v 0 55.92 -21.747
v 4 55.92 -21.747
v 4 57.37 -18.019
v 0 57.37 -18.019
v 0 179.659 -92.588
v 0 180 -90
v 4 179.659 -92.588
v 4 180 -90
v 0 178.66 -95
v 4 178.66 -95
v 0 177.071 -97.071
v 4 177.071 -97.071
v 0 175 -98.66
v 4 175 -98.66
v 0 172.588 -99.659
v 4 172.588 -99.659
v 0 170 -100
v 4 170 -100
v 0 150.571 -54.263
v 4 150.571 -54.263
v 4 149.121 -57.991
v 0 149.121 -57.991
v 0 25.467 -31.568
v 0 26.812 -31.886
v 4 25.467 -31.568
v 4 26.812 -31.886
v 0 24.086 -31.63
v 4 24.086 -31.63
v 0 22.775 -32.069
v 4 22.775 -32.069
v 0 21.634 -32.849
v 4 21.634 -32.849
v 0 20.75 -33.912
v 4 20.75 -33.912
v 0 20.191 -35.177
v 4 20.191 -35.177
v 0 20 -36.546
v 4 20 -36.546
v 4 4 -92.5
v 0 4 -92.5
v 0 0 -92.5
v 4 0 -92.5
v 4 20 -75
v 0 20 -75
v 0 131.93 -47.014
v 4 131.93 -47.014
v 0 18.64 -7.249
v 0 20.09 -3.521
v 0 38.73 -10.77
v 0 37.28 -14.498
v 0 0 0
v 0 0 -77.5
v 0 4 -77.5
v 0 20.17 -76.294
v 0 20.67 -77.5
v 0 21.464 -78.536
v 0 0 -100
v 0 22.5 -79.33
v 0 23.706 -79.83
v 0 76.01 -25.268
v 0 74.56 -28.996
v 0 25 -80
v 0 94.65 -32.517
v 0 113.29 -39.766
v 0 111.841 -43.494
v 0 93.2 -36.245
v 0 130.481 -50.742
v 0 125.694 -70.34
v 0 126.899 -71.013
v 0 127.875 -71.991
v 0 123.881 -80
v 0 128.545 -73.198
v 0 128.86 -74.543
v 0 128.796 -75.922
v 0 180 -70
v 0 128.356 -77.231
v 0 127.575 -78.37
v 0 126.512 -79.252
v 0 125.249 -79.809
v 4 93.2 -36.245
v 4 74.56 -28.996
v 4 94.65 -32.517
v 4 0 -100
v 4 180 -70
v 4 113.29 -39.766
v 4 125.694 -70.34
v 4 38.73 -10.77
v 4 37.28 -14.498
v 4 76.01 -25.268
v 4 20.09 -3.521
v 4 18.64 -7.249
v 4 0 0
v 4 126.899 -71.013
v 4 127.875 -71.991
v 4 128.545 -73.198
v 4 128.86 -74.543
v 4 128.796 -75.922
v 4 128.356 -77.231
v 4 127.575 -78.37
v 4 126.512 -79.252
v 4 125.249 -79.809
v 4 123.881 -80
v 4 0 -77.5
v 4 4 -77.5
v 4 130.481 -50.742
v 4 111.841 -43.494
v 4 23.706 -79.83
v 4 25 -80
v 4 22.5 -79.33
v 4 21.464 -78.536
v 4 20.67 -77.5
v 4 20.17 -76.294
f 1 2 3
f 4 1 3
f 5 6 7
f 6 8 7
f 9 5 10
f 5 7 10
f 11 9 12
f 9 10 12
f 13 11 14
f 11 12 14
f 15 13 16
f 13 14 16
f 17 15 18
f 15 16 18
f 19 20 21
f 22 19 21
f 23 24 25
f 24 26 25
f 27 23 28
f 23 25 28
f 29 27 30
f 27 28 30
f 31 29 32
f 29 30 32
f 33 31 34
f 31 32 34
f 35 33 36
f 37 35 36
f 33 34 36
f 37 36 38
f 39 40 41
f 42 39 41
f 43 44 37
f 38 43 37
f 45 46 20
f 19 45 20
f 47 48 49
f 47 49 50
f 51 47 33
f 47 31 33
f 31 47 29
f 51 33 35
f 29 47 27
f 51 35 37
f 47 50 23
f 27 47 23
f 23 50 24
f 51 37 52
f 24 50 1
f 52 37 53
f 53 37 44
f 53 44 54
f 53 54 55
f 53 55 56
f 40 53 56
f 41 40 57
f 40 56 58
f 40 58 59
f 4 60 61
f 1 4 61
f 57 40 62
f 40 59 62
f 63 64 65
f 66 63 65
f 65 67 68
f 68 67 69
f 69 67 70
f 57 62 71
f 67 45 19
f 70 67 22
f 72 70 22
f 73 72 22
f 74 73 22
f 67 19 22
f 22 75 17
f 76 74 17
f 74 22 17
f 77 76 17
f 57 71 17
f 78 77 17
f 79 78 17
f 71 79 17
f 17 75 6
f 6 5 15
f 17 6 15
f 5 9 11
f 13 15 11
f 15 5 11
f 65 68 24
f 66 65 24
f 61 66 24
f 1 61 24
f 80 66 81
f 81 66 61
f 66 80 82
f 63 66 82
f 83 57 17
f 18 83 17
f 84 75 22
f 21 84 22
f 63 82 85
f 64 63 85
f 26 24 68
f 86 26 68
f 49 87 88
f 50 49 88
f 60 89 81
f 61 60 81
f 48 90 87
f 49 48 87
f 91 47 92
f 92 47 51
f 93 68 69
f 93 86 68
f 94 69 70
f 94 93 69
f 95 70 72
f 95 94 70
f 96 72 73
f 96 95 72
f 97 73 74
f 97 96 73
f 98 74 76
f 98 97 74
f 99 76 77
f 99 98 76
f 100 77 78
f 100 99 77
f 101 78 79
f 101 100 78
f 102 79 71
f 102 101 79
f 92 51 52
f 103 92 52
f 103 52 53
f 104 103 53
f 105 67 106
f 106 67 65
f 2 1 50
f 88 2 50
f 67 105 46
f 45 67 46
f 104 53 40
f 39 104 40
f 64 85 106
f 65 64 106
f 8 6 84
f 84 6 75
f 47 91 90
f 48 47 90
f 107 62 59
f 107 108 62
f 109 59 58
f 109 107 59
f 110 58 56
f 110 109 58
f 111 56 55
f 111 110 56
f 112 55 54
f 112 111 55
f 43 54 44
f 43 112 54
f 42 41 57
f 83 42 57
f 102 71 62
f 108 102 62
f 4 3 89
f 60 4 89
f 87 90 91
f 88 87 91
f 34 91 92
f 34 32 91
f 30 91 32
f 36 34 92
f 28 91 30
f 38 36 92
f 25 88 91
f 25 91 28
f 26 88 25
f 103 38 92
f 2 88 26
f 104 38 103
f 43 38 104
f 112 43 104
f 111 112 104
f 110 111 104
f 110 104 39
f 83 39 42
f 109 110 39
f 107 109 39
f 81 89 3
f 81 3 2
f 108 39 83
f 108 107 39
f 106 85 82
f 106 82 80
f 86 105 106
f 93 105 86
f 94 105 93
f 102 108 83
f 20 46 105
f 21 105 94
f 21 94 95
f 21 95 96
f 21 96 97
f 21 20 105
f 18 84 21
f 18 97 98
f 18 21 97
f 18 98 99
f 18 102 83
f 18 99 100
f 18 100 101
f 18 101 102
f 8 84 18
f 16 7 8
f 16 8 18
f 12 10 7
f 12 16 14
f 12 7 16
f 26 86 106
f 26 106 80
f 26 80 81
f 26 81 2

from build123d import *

# Parameters (mm, degrees)
ESTRUSIONE_ESTRUSIONE1_DEPTH = 4
ESTRUSIONE_ESTRUSIONE2_DEPTH = 4
RACCORDO2_R                  = 10
RACCORDO3_R                  = 5


with BuildPart() as part:
    # Schizzo1 → Estrusione-Estrusione1 (new body)
    with BuildSketch(Plane(origin=(0, 0, 0), x_dir=(0, 0, -1), z_dir=(1, 0, 0))):
        Polygon((70, 180), (0, 0), (77.5, 0), (77.5, 4), (92.5, 4), (92.5, 0), (100, 0), (100, 180), align=None)
        Polygon((80, 150.533691669), (80, 20), (29.236897684, 20), align=None, mode=Mode.SUBTRACT)
    extrude(amount=ESTRUSIONE_ESTRUSIONE1_DEPTH)

    # Schizzo2 → Estrusione-Estrusione2 (add)
    with BuildSketch(Plane(origin=(4, 0, 0), x_dir=(0, 0, -1), z_dir=(1, 0, 0))):
        Polygon((7.248925223, 18.640093431), (3.520906537, 20.089878475), (10.76983176, 38.729971906), (14.497850446, 37.280186862), align=None)
        Polygon((28.995700892, 74.560373723), (21.746775669, 55.920280292), (18.018756983, 57.370065337), (25.267682206, 76.010158768), align=None)
        Polygon((43.493551339, 111.840560585), (36.244626115, 93.200467154), (32.516607429, 94.650252199), (39.765532652, 113.29034563), align=None)
        Polygon((57.991401785, 149.120747447), (50.742476562, 130.480654016), (47.014457876, 131.93043906), (54.263383099, 150.570532491), align=None)
    extrude(amount=-ESTRUSIONE_ESTRUSIONE2_DEPTH)

    # Raccordo2
    raccordo2_edges = [part.edges().sort_by_distance(p)[0] for p in [
        (2, 180, -100),
    ]]
    fillet(raccordo2_edges, radius=RACCORDO2_R)

    # Raccordo3
    raccordo3_edges = [part.edges().sort_by_distance(p)[0] for p in [
        (2, 20, -80),
        (2, 150.533691669, -80),
        (2, 20, -29.236897684),
    ]]
    fillet(raccordo3_edges, radius=RACCORDO3_R)


solid = part.part
